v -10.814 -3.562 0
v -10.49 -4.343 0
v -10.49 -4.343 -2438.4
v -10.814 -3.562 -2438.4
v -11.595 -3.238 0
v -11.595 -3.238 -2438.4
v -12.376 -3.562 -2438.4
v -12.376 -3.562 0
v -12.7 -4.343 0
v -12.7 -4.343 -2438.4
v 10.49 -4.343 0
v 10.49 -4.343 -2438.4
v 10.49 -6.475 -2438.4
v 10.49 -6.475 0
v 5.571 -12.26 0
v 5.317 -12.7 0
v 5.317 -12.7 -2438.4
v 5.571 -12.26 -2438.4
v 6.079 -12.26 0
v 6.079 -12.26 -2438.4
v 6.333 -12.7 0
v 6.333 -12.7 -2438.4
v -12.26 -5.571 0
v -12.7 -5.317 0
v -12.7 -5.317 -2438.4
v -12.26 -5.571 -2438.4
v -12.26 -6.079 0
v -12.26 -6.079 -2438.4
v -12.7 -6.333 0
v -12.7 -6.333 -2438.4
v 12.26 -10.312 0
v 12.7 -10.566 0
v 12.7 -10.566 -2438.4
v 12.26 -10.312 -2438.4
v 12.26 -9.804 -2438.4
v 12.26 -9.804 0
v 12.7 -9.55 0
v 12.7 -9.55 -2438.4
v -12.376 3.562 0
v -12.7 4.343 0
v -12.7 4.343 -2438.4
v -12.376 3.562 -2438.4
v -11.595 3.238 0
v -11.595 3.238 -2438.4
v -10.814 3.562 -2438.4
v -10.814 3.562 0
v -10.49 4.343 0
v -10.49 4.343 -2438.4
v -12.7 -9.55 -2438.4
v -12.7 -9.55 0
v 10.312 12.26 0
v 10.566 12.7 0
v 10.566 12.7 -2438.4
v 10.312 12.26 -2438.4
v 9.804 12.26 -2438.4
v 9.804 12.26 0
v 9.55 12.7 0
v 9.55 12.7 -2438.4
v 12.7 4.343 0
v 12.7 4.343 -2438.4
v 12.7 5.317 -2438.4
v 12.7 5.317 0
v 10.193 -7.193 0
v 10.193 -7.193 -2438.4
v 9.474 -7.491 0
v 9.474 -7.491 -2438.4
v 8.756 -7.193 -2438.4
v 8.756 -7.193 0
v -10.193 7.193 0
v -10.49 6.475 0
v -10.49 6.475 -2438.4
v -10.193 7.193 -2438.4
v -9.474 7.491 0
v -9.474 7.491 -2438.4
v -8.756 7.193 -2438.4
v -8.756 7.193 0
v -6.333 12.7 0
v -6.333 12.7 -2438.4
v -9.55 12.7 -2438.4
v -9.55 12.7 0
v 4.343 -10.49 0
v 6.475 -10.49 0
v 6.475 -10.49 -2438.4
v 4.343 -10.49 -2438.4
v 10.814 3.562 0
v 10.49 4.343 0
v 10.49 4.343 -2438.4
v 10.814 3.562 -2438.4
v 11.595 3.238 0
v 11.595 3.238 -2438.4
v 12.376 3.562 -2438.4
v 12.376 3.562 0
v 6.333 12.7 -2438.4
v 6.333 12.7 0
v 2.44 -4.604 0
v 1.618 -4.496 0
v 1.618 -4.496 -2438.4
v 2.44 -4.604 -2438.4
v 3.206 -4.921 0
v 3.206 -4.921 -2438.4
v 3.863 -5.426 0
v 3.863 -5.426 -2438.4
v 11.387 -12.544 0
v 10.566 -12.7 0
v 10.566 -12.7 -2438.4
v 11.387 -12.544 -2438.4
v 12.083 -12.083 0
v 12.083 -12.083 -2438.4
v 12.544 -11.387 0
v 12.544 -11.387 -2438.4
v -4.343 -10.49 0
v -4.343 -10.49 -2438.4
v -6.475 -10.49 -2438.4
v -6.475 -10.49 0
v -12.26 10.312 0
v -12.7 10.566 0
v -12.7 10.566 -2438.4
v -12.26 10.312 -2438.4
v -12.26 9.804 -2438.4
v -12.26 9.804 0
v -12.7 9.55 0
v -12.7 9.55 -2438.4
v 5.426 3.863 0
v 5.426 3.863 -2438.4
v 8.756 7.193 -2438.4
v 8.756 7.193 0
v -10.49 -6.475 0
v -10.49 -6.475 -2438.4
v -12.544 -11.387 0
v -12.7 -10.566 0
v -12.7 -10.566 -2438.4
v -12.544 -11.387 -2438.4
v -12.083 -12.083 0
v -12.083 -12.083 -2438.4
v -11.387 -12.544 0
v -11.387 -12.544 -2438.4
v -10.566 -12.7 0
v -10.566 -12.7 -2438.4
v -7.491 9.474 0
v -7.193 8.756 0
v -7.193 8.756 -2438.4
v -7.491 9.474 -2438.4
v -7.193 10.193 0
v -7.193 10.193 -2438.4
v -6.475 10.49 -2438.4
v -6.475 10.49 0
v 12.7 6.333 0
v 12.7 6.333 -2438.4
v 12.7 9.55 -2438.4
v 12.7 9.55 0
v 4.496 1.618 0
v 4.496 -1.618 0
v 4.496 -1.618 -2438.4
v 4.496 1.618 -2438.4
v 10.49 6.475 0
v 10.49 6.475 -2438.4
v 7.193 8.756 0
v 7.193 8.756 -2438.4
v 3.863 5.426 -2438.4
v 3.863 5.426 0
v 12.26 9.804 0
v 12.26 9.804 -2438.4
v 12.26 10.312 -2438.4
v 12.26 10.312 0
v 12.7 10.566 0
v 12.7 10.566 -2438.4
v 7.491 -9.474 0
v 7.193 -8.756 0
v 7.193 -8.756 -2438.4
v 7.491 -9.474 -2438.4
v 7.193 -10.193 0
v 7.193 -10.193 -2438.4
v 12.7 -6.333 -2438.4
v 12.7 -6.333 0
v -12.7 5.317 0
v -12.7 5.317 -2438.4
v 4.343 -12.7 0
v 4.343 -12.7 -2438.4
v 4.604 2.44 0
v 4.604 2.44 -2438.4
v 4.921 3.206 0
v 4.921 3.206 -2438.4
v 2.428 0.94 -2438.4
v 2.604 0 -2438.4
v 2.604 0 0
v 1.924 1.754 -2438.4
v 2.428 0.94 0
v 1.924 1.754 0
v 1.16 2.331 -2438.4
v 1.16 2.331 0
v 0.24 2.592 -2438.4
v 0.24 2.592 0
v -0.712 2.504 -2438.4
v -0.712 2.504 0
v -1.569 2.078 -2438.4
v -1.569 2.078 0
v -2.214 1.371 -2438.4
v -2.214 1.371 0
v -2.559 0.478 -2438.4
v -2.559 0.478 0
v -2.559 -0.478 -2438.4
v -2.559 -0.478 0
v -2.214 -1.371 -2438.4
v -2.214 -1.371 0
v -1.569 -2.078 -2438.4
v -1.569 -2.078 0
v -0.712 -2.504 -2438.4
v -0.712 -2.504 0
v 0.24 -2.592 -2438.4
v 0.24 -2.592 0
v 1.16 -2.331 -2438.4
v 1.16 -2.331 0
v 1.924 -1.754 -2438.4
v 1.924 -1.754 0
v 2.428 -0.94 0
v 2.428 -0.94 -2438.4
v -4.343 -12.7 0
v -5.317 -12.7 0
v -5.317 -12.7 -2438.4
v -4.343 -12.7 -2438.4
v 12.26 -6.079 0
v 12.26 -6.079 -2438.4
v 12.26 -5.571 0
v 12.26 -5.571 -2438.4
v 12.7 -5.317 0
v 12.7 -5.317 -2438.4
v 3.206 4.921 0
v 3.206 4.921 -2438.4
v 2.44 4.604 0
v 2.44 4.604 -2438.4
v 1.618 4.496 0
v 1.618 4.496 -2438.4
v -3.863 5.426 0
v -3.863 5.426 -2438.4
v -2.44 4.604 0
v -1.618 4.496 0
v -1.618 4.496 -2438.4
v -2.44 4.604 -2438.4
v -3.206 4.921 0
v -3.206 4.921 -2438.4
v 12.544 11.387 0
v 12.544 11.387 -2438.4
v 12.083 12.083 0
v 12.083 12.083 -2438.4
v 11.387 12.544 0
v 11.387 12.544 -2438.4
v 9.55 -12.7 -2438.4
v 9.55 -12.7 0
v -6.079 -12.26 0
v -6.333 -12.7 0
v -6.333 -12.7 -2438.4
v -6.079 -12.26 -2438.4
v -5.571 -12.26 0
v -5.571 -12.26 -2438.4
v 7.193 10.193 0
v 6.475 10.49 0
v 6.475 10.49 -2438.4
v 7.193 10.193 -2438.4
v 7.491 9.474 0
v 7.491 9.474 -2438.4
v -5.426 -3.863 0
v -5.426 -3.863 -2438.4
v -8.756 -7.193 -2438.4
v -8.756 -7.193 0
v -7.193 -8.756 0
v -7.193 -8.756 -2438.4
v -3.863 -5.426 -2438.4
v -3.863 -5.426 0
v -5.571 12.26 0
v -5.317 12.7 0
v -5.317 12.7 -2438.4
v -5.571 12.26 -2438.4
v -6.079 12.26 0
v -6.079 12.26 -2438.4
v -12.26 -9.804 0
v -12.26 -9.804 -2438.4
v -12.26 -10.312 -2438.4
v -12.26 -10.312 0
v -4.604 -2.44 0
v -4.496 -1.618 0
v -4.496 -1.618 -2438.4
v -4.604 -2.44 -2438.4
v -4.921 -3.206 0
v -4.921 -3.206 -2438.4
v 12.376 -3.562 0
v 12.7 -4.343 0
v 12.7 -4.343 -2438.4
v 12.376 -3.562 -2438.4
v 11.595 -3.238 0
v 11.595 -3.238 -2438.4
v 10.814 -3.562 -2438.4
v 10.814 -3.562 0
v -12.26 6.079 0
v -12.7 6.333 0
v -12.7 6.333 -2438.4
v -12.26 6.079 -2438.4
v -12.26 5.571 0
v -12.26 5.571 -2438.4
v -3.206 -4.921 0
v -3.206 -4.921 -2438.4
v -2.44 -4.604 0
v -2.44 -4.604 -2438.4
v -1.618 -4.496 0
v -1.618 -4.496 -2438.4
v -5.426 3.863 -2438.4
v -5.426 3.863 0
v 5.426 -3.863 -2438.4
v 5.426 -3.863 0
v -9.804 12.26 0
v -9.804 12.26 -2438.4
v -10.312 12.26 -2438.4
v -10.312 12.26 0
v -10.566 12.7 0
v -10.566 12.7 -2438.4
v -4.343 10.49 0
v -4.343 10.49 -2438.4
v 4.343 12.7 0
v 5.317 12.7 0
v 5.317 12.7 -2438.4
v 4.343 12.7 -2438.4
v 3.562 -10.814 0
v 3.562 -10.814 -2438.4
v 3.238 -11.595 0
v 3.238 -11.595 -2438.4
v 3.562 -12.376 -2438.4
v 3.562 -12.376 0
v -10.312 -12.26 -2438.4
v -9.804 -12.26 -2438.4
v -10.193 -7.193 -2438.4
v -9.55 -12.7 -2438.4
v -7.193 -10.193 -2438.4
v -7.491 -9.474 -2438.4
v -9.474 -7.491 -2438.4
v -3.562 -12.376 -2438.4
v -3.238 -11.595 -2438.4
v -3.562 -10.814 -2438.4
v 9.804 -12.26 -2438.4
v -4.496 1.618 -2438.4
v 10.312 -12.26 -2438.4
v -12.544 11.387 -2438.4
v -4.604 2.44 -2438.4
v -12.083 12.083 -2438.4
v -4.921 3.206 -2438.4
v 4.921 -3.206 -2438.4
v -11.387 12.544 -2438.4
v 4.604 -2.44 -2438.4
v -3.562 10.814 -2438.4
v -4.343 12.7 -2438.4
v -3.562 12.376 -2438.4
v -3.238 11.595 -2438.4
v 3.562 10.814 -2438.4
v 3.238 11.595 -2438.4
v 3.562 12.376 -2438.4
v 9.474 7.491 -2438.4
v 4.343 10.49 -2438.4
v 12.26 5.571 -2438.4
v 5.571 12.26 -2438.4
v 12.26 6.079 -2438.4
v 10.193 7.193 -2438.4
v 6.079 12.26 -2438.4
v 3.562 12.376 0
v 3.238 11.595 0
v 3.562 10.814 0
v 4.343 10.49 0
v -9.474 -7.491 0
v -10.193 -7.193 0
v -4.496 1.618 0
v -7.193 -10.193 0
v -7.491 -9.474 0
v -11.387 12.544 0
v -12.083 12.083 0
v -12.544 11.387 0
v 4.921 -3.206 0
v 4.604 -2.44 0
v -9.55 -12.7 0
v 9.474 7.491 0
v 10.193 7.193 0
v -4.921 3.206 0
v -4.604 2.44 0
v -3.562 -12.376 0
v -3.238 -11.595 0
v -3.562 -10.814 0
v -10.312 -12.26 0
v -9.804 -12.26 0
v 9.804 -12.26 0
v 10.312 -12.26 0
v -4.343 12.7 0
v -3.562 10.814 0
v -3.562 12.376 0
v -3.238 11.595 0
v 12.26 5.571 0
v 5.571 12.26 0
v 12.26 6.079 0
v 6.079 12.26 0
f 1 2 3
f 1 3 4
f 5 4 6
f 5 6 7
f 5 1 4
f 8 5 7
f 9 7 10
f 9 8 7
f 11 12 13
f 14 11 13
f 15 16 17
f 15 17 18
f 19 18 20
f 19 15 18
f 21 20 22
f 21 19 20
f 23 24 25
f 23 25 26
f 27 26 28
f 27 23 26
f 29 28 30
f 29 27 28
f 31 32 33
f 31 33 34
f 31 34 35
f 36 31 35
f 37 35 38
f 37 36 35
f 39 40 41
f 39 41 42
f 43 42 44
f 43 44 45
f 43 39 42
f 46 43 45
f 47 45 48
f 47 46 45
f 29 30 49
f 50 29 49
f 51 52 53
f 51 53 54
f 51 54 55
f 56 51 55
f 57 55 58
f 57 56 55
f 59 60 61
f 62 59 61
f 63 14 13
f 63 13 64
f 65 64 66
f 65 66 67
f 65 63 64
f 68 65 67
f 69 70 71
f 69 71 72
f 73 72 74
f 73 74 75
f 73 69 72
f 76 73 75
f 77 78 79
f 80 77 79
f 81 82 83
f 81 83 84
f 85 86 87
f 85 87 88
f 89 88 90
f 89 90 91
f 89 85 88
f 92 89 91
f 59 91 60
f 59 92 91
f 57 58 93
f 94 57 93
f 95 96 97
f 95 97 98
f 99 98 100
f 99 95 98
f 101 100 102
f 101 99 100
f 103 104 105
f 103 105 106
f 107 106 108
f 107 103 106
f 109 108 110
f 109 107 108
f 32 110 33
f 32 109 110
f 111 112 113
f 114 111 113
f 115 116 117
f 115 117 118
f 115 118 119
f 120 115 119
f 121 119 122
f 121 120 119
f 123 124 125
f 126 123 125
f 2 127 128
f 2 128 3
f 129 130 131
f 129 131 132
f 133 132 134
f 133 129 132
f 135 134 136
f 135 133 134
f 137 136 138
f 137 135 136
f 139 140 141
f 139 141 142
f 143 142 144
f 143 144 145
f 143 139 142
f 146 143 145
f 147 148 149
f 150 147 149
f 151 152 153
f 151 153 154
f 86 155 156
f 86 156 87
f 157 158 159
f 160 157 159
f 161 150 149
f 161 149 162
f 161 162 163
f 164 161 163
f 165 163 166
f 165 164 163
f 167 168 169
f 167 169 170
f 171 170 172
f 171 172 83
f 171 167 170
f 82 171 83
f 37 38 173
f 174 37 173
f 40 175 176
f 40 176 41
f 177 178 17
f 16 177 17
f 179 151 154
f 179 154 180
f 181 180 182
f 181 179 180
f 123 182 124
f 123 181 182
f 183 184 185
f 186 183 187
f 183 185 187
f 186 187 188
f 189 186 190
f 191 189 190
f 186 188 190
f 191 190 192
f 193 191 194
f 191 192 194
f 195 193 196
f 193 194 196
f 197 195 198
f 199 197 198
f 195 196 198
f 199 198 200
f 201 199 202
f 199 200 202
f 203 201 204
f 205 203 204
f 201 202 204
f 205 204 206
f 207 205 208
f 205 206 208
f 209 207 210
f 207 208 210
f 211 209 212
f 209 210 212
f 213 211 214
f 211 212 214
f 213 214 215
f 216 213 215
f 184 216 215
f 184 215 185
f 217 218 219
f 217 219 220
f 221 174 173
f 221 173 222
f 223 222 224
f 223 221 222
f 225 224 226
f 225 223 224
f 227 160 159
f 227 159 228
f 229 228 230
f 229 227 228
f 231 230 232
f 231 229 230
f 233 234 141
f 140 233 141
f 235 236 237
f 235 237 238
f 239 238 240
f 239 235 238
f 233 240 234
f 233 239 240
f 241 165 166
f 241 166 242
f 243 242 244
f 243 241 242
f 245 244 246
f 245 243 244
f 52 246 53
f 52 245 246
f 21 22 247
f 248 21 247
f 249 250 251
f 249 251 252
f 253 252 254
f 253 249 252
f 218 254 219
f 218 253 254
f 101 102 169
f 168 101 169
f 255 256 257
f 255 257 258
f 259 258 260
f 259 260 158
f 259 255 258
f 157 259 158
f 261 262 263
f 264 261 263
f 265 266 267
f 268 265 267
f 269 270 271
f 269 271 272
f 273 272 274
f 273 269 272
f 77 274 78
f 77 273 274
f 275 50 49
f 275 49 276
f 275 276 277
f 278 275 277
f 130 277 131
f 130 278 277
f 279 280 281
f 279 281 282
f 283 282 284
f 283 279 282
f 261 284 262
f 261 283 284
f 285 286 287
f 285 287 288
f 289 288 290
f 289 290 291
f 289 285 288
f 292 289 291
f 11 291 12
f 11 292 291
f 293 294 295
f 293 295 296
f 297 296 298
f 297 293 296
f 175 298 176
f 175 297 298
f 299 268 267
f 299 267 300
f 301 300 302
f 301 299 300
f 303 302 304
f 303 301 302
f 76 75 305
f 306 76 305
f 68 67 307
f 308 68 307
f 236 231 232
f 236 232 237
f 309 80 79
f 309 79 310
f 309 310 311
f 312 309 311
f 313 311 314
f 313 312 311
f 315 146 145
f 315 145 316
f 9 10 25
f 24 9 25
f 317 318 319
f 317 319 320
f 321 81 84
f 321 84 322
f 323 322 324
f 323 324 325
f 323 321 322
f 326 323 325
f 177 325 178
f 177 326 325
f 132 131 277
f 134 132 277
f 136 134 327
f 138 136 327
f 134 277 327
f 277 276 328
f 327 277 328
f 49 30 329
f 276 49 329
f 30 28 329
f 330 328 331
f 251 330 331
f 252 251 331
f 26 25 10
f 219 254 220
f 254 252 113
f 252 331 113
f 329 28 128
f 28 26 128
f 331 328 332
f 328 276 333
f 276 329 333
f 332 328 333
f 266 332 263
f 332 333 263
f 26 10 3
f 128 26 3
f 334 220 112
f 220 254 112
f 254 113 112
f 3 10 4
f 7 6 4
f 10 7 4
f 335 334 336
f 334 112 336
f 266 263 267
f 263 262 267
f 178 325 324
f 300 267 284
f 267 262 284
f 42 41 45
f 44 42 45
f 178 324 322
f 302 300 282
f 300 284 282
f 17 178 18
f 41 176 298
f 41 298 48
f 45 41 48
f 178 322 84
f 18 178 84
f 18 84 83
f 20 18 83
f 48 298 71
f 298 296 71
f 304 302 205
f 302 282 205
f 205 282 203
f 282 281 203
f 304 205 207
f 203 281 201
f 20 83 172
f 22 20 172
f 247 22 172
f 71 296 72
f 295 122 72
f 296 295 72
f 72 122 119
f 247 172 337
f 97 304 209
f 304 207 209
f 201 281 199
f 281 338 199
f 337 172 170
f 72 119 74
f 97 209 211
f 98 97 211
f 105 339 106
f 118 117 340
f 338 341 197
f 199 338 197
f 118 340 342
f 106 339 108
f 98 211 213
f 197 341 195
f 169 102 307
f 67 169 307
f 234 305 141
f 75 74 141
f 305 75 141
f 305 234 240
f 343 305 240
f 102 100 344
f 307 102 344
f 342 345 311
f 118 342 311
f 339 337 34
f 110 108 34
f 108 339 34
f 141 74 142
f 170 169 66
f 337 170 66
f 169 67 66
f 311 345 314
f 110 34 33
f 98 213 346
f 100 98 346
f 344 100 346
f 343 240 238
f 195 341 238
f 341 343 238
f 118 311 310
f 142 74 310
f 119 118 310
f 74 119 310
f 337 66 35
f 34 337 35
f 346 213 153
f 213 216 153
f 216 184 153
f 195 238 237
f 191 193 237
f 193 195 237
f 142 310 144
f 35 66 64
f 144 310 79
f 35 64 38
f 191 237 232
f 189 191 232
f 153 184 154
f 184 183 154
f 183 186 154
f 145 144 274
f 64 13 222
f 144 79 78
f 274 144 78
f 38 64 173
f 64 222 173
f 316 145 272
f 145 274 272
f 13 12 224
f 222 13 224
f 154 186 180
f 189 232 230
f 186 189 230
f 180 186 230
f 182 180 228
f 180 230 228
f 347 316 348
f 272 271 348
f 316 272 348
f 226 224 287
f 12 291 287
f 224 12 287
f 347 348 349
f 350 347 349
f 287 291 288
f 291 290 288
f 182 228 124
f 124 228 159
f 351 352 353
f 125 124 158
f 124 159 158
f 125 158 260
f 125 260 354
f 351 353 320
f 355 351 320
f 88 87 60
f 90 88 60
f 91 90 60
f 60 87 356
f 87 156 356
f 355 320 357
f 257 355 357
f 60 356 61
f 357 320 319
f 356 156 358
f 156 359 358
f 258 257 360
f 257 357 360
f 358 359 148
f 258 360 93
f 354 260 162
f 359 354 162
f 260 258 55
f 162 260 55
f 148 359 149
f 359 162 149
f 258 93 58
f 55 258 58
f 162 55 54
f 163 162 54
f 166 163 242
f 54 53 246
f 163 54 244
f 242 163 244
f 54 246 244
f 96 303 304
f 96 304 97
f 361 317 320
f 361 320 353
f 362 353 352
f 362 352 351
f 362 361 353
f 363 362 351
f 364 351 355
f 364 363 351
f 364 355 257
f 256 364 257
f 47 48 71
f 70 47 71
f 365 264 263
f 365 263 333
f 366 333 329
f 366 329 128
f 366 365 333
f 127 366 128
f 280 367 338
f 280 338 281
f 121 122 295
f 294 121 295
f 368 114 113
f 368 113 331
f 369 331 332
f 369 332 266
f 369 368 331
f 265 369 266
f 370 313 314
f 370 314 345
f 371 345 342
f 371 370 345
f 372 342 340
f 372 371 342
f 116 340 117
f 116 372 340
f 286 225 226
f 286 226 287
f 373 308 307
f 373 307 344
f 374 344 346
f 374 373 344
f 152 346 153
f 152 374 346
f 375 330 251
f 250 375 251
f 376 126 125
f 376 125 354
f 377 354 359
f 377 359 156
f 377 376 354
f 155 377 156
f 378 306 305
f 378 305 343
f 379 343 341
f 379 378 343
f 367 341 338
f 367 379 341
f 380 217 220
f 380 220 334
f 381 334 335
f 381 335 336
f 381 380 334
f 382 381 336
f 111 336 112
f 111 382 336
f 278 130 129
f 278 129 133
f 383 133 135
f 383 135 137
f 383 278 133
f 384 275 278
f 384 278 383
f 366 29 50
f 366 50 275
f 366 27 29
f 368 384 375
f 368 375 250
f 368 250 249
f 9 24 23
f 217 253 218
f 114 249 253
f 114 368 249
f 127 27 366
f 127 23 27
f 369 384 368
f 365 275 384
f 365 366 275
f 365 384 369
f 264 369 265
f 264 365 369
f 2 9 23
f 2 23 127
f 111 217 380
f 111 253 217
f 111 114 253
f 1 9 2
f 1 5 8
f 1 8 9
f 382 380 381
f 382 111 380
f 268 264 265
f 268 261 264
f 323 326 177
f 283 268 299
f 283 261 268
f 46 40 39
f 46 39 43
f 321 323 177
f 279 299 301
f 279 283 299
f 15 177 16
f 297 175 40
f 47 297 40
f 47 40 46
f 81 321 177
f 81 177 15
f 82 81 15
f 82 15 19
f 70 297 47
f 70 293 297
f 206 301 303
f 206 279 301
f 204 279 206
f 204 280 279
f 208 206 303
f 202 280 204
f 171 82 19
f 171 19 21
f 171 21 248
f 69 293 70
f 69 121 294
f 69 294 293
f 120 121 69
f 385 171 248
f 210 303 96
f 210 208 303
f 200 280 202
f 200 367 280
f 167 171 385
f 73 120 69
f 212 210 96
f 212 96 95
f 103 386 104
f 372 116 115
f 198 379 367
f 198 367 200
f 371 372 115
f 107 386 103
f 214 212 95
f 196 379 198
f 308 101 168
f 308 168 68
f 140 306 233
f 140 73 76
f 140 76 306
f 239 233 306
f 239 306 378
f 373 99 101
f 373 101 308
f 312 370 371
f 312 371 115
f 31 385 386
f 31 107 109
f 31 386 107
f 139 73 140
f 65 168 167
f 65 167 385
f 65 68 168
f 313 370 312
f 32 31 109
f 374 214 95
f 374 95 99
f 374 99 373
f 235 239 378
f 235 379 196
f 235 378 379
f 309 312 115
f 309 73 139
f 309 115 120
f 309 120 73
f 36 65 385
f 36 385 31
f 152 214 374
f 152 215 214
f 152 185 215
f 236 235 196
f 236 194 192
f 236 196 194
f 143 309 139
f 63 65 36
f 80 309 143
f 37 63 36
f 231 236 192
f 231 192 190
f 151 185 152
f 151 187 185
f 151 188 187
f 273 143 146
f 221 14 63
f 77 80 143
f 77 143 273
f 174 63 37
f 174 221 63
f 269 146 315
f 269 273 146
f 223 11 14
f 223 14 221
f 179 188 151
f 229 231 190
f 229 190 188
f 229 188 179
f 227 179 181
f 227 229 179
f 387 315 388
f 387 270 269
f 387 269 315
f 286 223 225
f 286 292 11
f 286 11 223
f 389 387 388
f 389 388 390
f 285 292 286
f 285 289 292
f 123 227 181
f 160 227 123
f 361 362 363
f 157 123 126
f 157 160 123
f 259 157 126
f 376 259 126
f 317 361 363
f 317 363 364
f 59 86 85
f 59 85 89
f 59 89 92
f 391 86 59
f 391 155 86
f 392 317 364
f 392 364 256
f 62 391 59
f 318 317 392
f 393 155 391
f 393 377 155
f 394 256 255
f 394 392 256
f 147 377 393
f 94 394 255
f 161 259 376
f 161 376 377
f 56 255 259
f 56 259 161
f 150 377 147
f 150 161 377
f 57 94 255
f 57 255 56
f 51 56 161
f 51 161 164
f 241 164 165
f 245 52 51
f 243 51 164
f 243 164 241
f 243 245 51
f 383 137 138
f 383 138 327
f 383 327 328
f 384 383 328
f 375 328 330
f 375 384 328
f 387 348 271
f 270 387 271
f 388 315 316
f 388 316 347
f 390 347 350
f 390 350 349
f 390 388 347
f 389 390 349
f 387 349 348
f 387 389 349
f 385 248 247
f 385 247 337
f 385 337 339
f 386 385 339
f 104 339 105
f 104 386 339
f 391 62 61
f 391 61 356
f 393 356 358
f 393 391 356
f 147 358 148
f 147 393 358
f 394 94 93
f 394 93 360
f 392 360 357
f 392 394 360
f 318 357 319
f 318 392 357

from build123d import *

# Parameters (mm, degrees)
SKETCH1_R           = 2.6035
BOSS_EXTRUDE1_DEPTH = 2438.4


with BuildPart() as part:
    # Sketch1 → Boss-Extrude1 (new body)
    with BuildSketch(Plane.XY):
        with BuildLine():
            Line((-12.7, -6.3330836), (-12.7, -9.5504))
            ThreePointArc((-12.7, -9.5504), (-12.192000006, -10.058323491), (-12.699846982, -10.566399977))
            ThreePointArc((-12.699846982, -10.566399977), (-12.082522516, -12.082522516), (-10.566399977, -12.699846982))
            ThreePointArc((-10.566399977, -12.699846982), (-10.058323491, -12.192000006), (-9.5504, -12.7))
            Line((-9.5504, -12.7), (-6.3330836, -12.7))
            ThreePointArc((-6.3330836, -12.7), (-5.8250836, -12.192), (-5.3170836, -12.7))
            Line((-5.3170836, -12.7), (-4.343399971, -12.7))
            ThreePointArc((-4.343399971, -12.7), (-3.238499971, -11.5951), (-4.343399971, -10.4902))
            Line((-4.343399971, -10.4902), (-6.474794456, -10.4902))
            ThreePointArc((-6.474794456, -10.4902), (-7.413456061, -9.863006367), (-7.193214945, -8.75577951))
            Line((-7.193214945, -8.75577951), (-3.863171405, -5.42573597))
            ThreePointArc((-3.863171405, -5.42573597), (-2.833127272, -4.737482484), (-1.618107374, -4.4958))
            Line((-1.618107374, -4.4958), (1.618107374, -4.4958))
            ThreePointArc((1.618107374, -4.4958), (2.833127272, -4.737482484), (3.863171405, -5.42573597))
            Line((3.863171405, -5.42573597), (7.193214945, -8.75577951))
            ThreePointArc((7.193214945, -8.75577951), (7.413456061, -9.863006367), (6.474794456, -10.4902))
            Line((6.474794456, -10.4902), (4.3434, -10.4902))
            ThreePointArc((4.3434, -10.4902), (3.2385, -11.5951), (4.3434, -12.7))
            Line((4.3434, -12.7), (5.3170836, -12.7))
            ThreePointArc((5.3170836, -12.7), (5.8250836, -12.192), (6.3330836, -12.7))
            Line((6.3330836, -12.7), (9.5504, -12.7))
            ThreePointArc((9.5504, -12.7), (10.058323491, -12.192000006), (10.566399977, -12.699846982))
            ThreePointArc((10.566399977, -12.699846982), (12.082522516, -12.082522516), (12.699846982, -10.566399977))
            ThreePointArc((12.699846982, -10.566399977), (12.192000006, -10.058323491), (12.7, -9.5504))
            Line((12.7, -9.5504), (12.7, -6.3330836))
            ThreePointArc((12.7, -6.3330836), (12.192, -5.8250836), (12.7, -5.3170836))
            Line((12.7, -5.3170836), (12.7, -4.343399971))
            ThreePointArc((12.7, -4.343399971), (11.5951, -3.238499971), (10.4902, -4.343399971))
            Line((10.4902, -4.343399971), (10.4902, -6.474794456))
            ThreePointArc((10.4902, -6.474794456), (9.863006367, -7.413456061), (8.75577951, -7.193214945))
            Line((8.75577951, -7.193214945), (5.42573597, -3.863171405))
            ThreePointArc((5.42573597, -3.863171405), (4.737482484, -2.833127272), (4.4958, -1.618107374))
            Line((4.4958, -1.618107374), (4.4958, 1.618107374))
            ThreePointArc((4.4958, 1.618107374), (4.737482484, 2.833127272), (5.42573597, 3.863171405))
            Line((5.42573597, 3.863171405), (8.75577951, 7.193214945))
            ThreePointArc((8.75577951, 7.193214945), (9.863006367, 7.413456061), (10.4902, 6.474794456))
            Line((10.4902, 6.474794456), (10.4902, 4.3434))
            ThreePointArc((10.4902, 4.3434), (11.5951, 3.2385), (12.7, 4.3434))
            Line((12.7, 4.3434), (12.7, 5.3170836))
            ThreePointArc((12.7, 5.3170836), (12.192, 5.8250836), (12.7, 6.3330836))
            Line((12.7, 6.3330836), (12.7, 9.5504))
            ThreePointArc((12.7, 9.5504), (12.192000006, 10.058323491), (12.699846982, 10.566399977))
            ThreePointArc((12.699846982, 10.566399977), (12.082522516, 12.082522516), (10.566399977, 12.699846982))
            ThreePointArc((10.566399977, 12.699846982), (10.058323491, 12.192000006), (9.5504, 12.7))
            Line((9.5504, 12.7), (6.3330836, 12.7))
            ThreePointArc((6.3330836, 12.7), (5.8250836, 12.192), (5.3170836, 12.7))
            Line((5.3170836, 12.7), (4.343399971, 12.7))
            ThreePointArc((4.343399971, 12.7), (3.238499971, 11.5951), (4.343399971, 10.4902))
            Line((4.343399971, 10.4902), (6.474794456, 10.4902))
            ThreePointArc((6.474794456, 10.4902), (7.413456061, 9.863006367), (7.193214945, 8.75577951))
            Line((7.193214945, 8.75577951), (3.863171405, 5.42573597))
            ThreePointArc((3.863171405, 5.42573597), (2.833127272, 4.737482484), (1.618107374, 4.4958))
            Line((1.618107374, 4.4958), (-1.618107374, 4.4958))
            ThreePointArc((-1.618107374, 4.4958), (-2.833127272, 4.737482484), (-3.863171405, 5.42573597))
            Line((-3.863171405, 5.42573597), (-7.193214945, 8.75577951))
            ThreePointArc((-7.193214945, 8.75577951), (-7.413456061, 9.863006367), (-6.474794456, 10.4902))
            Line((-6.474794456, 10.4902), (-4.3434, 10.4902))
            ThreePointArc((-4.3434, 10.4902), (-3.2385, 11.5951), (-4.3434, 12.7))
            Line((-4.3434, 12.7), (-5.3170836, 12.7))
            ThreePointArc((-5.3170836, 12.7), (-5.8250836, 12.192), (-6.3330836, 12.7))
            Line((-6.3330836, 12.7), (-9.5504, 12.7))
            ThreePointArc((-9.5504, 12.7), (-10.058323491, 12.192000006), (-10.566399977, 12.699846982))
            ThreePointArc((-10.566399977, 12.699846982), (-12.082522516, 12.082522516), (-12.699846982, 10.566399977))
            ThreePointArc((-12.699846982, 10.566399977), (-12.192000006, 10.058323491), (-12.7, 9.5504))
            Line((-12.7, 9.5504), (-12.7, 6.3330836))
            ThreePointArc((-12.7, 6.3330836), (-12.192, 5.8250836), (-12.7, 5.3170836))
            Line((-12.7, 5.3170836), (-12.7, 4.343399971))
            ThreePointArc((-12.7, 4.343399971), (-11.5951, 3.238499971), (-10.4902, 4.343399971))
            Line((-10.4902, 4.343399971), (-10.4902, 6.474794456))
            ThreePointArc((-10.4902, 6.474794456), (-9.863006367, 7.413456061), (-8.75577951, 7.193214945))
            Line((-8.75577951, 7.193214945), (-5.42573597, 3.863171405))
            ThreePointArc((-5.42573597, 3.863171405), (-4.737482484, 2.833127272), (-4.4958, 1.618107374))
            Line((-4.4958, 1.618107374), (-4.4958, -1.618107374))
            ThreePointArc((-4.4958, -1.618107374), (-4.737482484, -2.833127272), (-5.42573597, -3.863171405))
            Line((-5.42573597, -3.863171405), (-8.75577951, -7.193214945))
            ThreePointArc((-8.75577951, -7.193214945), (-9.863006367, -7.413456061), (-10.4902, -6.474794456))
            Line((-10.4902, -6.474794456), (-10.4902, -4.3434))
            ThreePointArc((-10.4902, -4.3434), (-11.5951, -3.2385), (-12.7, -4.3434))
            Line((-12.7, -4.3434), (-12.7, -5.3170836))
            ThreePointArc((-12.7, -5.3170836), (-12.192, -5.8250836), (-12.7, -6.3330836))
        make_face()
        Circle(SKETCH1_R, mode=Mode.SUBTRACT)
    extrude(amount=-BOSS_EXTRUDE1_DEPTH)


solid = part.part
